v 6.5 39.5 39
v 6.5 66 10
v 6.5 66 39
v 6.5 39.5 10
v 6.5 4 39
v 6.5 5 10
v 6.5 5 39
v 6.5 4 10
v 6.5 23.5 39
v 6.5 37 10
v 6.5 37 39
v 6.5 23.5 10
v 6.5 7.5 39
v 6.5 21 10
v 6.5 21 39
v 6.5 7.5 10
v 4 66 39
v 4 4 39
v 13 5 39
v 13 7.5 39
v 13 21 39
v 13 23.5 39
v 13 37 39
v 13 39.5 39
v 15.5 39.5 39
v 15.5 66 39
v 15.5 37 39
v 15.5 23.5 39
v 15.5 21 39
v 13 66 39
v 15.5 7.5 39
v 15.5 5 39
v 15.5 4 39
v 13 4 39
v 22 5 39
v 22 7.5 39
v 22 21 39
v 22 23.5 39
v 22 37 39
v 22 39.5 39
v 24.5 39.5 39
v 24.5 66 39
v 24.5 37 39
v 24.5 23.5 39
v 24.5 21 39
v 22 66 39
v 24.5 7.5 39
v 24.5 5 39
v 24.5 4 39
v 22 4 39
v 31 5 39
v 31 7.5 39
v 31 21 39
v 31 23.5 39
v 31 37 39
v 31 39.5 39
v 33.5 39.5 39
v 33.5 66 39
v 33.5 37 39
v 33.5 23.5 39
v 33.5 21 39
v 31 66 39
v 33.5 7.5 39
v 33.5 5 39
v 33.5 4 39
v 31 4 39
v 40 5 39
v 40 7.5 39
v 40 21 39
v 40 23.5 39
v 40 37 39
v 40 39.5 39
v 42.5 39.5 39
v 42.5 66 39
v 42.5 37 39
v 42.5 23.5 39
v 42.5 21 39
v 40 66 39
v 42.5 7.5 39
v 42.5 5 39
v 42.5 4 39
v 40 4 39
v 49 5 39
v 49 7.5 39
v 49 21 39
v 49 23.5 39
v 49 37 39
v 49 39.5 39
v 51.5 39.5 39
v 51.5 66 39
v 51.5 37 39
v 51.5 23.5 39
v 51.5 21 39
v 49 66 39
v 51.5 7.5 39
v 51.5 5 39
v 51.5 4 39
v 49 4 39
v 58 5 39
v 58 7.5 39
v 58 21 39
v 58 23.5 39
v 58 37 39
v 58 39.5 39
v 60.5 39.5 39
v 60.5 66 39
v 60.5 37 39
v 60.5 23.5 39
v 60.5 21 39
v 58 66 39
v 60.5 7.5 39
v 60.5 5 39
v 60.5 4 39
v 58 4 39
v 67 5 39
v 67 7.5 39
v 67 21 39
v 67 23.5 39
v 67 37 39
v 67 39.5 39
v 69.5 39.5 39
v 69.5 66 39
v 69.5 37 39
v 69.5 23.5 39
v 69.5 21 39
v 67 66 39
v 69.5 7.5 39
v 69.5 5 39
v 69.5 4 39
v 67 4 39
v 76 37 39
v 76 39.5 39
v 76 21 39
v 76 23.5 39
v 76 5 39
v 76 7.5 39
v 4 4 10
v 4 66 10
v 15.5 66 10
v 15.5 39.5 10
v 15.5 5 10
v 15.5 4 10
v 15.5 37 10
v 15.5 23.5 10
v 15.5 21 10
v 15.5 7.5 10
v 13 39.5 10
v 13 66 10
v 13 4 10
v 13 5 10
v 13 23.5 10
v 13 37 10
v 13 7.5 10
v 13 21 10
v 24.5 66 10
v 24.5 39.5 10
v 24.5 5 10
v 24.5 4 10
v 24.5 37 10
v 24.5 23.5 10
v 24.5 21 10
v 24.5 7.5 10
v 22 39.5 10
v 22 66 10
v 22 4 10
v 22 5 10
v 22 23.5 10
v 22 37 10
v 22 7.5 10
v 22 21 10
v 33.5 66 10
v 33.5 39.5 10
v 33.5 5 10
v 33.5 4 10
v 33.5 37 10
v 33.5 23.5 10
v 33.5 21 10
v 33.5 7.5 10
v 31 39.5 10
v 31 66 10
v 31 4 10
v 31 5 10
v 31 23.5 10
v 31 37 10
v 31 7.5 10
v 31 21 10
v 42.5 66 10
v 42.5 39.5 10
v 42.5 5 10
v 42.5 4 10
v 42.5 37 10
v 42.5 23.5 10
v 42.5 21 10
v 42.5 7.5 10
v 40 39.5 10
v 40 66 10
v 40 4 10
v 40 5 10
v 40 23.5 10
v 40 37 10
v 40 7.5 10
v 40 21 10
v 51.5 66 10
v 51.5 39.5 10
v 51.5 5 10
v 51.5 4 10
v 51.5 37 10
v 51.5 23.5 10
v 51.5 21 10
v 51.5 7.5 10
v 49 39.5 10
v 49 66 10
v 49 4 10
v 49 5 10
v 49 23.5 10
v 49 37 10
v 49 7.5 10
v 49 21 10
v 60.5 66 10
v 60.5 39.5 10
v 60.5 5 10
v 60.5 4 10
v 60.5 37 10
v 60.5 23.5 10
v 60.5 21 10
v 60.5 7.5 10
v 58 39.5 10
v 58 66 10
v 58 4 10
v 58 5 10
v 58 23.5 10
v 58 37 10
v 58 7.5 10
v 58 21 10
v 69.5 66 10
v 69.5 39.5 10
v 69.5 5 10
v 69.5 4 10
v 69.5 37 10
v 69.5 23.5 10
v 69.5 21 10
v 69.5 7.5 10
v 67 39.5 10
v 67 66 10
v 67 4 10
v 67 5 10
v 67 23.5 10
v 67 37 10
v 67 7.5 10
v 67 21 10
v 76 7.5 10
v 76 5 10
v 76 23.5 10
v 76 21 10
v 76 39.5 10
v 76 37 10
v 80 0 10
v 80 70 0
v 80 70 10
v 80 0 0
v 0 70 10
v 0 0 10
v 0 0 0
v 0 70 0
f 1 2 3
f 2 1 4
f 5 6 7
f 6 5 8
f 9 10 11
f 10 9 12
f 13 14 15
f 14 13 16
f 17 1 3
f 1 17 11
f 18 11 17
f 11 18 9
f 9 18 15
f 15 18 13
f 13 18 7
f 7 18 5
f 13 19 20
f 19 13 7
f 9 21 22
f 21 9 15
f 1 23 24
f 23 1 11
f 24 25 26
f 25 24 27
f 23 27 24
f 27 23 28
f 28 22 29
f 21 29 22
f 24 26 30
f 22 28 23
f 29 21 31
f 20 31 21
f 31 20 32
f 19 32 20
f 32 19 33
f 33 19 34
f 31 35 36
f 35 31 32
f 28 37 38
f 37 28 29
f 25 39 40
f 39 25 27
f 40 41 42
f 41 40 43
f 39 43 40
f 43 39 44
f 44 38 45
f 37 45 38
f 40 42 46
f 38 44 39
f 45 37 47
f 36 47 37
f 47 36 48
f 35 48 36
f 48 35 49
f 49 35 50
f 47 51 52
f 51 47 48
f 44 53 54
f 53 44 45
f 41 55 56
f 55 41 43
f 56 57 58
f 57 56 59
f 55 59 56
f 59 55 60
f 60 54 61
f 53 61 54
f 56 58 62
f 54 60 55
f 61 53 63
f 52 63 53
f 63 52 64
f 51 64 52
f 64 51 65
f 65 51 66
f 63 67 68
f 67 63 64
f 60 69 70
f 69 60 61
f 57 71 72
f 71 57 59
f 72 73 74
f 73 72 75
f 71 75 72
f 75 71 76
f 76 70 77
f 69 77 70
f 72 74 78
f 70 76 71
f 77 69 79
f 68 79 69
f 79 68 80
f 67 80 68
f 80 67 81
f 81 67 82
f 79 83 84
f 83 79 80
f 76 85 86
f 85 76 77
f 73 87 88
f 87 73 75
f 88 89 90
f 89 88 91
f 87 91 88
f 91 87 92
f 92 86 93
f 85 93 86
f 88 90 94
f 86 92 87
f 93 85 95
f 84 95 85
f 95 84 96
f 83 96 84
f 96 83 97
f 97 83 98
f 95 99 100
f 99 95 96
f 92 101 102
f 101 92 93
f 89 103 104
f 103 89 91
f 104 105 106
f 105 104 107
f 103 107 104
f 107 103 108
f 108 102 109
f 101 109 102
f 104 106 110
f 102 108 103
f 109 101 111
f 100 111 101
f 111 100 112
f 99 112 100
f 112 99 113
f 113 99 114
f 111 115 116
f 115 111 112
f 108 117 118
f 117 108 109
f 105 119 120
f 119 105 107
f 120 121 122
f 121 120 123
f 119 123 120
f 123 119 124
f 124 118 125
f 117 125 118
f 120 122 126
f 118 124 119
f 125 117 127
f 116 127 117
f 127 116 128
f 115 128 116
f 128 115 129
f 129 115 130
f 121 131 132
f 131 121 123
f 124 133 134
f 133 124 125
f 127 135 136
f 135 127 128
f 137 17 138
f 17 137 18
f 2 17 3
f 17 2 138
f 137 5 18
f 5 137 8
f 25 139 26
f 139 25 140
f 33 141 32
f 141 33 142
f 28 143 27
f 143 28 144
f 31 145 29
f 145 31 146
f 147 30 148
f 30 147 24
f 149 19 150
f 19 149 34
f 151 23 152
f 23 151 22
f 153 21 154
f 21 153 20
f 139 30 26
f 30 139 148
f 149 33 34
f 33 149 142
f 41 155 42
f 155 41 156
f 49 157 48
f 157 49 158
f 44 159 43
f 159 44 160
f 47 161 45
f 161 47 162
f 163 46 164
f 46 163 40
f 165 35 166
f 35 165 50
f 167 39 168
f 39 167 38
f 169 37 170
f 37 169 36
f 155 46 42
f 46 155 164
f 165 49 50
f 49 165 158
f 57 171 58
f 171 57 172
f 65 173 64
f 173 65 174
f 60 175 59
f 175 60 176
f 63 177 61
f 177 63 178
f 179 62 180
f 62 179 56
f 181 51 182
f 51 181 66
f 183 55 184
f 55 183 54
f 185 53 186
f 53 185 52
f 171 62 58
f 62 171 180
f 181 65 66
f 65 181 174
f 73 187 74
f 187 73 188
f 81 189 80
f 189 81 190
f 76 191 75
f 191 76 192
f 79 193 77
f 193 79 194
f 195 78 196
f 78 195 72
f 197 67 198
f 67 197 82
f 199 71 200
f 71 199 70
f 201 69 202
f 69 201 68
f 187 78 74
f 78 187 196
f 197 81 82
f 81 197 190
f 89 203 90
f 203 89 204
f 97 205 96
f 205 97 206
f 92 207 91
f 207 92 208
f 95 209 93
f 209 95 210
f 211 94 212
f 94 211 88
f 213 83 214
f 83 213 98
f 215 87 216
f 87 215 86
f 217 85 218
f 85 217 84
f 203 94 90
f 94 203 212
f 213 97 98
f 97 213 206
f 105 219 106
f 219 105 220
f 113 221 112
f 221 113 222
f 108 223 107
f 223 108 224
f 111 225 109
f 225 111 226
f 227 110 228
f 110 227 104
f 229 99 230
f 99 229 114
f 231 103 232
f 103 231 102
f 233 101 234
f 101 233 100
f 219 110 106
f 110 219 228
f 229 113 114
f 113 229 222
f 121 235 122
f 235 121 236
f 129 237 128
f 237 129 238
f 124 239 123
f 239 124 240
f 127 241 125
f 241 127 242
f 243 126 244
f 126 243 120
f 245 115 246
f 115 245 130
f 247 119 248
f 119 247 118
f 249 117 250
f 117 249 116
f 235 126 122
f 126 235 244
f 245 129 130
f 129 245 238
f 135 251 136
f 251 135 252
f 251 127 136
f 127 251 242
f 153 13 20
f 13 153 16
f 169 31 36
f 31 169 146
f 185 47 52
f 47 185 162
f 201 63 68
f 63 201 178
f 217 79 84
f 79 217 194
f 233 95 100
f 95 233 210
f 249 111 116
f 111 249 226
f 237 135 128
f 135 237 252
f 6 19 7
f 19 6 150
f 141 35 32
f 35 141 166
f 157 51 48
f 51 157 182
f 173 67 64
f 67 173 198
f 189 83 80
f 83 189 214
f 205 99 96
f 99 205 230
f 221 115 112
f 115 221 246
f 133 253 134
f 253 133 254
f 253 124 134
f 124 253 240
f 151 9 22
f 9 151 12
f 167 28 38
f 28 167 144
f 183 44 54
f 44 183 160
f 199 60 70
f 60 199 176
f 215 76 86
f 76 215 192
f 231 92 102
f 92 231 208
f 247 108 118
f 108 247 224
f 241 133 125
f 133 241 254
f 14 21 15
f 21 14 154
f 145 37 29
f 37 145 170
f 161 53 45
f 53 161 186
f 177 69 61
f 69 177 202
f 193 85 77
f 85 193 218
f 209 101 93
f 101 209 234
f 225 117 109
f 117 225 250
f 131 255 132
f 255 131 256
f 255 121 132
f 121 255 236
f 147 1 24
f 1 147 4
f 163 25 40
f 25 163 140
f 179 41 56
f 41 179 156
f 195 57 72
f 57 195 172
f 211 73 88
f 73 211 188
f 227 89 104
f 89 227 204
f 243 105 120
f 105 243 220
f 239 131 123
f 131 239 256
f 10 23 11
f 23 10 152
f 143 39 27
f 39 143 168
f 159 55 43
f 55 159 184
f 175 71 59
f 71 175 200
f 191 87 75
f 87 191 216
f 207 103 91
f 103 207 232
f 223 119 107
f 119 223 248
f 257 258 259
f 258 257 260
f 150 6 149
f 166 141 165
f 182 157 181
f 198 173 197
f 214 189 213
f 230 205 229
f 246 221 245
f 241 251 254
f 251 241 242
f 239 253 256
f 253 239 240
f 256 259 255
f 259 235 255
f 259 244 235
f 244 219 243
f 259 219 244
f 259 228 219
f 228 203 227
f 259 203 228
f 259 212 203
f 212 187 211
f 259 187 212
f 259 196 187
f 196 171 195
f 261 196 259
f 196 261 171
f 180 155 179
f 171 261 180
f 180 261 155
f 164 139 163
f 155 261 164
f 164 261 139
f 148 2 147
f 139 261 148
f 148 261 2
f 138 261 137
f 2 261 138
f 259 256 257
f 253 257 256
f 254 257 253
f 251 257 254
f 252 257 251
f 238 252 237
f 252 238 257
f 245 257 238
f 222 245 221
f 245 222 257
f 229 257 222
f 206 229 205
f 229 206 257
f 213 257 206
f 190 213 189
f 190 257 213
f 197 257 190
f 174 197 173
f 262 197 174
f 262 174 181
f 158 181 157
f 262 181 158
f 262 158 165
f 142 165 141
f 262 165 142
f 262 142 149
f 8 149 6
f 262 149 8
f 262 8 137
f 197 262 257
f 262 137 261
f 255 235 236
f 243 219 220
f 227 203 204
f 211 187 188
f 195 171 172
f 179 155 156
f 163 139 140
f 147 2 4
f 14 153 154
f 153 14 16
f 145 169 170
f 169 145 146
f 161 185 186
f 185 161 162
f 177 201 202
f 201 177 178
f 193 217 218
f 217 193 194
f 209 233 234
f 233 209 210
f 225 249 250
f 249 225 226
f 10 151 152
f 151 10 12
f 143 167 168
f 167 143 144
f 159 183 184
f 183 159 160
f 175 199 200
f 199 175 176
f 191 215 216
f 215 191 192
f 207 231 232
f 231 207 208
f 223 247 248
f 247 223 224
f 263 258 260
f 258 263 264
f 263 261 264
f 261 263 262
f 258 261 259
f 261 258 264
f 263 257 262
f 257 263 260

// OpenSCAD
$fn = 32;

// ----------------------------------------------------------------------
// Heatsink: cross fin block
// ----------------------------------------------------------------------

// --- parameters (mm) ---
base_l = 80;              // base length, X
base_w = 70;              // base width, Y
base_t = 10;              // base plate thickness
fin_h = 30;               // fin height above the base
fin_t = 2.5;              // fin thickness
edge = 4;                 // margin from the base ends
pitch = 9;                // fin pitch
rib_pitch = 16;           // cross rib pitch

n_fins = floor((base_l - 2 * edge - fin_t) / pitch) + 1;  // fin count
total_h = base_t + fin_h - 1;  // overall height
n_ribs = floor((base_w - 2 * edge) / rib_pitch);  // rib count

union() {
  cube([base_l, base_w, base_t]);
  for (i = [0 : n_fins - 1])
    translate([edge + i * pitch, edge, base_t - 1])
      cube([fin_t, base_w - 2 * edge, fin_h]);
  for (i = [0 : n_ribs - 1])
    translate([edge, edge + 1 + i * rib_pitch, base_t - 1])
      cube([base_l - 2 * edge, fin_t, fin_h]);
}
